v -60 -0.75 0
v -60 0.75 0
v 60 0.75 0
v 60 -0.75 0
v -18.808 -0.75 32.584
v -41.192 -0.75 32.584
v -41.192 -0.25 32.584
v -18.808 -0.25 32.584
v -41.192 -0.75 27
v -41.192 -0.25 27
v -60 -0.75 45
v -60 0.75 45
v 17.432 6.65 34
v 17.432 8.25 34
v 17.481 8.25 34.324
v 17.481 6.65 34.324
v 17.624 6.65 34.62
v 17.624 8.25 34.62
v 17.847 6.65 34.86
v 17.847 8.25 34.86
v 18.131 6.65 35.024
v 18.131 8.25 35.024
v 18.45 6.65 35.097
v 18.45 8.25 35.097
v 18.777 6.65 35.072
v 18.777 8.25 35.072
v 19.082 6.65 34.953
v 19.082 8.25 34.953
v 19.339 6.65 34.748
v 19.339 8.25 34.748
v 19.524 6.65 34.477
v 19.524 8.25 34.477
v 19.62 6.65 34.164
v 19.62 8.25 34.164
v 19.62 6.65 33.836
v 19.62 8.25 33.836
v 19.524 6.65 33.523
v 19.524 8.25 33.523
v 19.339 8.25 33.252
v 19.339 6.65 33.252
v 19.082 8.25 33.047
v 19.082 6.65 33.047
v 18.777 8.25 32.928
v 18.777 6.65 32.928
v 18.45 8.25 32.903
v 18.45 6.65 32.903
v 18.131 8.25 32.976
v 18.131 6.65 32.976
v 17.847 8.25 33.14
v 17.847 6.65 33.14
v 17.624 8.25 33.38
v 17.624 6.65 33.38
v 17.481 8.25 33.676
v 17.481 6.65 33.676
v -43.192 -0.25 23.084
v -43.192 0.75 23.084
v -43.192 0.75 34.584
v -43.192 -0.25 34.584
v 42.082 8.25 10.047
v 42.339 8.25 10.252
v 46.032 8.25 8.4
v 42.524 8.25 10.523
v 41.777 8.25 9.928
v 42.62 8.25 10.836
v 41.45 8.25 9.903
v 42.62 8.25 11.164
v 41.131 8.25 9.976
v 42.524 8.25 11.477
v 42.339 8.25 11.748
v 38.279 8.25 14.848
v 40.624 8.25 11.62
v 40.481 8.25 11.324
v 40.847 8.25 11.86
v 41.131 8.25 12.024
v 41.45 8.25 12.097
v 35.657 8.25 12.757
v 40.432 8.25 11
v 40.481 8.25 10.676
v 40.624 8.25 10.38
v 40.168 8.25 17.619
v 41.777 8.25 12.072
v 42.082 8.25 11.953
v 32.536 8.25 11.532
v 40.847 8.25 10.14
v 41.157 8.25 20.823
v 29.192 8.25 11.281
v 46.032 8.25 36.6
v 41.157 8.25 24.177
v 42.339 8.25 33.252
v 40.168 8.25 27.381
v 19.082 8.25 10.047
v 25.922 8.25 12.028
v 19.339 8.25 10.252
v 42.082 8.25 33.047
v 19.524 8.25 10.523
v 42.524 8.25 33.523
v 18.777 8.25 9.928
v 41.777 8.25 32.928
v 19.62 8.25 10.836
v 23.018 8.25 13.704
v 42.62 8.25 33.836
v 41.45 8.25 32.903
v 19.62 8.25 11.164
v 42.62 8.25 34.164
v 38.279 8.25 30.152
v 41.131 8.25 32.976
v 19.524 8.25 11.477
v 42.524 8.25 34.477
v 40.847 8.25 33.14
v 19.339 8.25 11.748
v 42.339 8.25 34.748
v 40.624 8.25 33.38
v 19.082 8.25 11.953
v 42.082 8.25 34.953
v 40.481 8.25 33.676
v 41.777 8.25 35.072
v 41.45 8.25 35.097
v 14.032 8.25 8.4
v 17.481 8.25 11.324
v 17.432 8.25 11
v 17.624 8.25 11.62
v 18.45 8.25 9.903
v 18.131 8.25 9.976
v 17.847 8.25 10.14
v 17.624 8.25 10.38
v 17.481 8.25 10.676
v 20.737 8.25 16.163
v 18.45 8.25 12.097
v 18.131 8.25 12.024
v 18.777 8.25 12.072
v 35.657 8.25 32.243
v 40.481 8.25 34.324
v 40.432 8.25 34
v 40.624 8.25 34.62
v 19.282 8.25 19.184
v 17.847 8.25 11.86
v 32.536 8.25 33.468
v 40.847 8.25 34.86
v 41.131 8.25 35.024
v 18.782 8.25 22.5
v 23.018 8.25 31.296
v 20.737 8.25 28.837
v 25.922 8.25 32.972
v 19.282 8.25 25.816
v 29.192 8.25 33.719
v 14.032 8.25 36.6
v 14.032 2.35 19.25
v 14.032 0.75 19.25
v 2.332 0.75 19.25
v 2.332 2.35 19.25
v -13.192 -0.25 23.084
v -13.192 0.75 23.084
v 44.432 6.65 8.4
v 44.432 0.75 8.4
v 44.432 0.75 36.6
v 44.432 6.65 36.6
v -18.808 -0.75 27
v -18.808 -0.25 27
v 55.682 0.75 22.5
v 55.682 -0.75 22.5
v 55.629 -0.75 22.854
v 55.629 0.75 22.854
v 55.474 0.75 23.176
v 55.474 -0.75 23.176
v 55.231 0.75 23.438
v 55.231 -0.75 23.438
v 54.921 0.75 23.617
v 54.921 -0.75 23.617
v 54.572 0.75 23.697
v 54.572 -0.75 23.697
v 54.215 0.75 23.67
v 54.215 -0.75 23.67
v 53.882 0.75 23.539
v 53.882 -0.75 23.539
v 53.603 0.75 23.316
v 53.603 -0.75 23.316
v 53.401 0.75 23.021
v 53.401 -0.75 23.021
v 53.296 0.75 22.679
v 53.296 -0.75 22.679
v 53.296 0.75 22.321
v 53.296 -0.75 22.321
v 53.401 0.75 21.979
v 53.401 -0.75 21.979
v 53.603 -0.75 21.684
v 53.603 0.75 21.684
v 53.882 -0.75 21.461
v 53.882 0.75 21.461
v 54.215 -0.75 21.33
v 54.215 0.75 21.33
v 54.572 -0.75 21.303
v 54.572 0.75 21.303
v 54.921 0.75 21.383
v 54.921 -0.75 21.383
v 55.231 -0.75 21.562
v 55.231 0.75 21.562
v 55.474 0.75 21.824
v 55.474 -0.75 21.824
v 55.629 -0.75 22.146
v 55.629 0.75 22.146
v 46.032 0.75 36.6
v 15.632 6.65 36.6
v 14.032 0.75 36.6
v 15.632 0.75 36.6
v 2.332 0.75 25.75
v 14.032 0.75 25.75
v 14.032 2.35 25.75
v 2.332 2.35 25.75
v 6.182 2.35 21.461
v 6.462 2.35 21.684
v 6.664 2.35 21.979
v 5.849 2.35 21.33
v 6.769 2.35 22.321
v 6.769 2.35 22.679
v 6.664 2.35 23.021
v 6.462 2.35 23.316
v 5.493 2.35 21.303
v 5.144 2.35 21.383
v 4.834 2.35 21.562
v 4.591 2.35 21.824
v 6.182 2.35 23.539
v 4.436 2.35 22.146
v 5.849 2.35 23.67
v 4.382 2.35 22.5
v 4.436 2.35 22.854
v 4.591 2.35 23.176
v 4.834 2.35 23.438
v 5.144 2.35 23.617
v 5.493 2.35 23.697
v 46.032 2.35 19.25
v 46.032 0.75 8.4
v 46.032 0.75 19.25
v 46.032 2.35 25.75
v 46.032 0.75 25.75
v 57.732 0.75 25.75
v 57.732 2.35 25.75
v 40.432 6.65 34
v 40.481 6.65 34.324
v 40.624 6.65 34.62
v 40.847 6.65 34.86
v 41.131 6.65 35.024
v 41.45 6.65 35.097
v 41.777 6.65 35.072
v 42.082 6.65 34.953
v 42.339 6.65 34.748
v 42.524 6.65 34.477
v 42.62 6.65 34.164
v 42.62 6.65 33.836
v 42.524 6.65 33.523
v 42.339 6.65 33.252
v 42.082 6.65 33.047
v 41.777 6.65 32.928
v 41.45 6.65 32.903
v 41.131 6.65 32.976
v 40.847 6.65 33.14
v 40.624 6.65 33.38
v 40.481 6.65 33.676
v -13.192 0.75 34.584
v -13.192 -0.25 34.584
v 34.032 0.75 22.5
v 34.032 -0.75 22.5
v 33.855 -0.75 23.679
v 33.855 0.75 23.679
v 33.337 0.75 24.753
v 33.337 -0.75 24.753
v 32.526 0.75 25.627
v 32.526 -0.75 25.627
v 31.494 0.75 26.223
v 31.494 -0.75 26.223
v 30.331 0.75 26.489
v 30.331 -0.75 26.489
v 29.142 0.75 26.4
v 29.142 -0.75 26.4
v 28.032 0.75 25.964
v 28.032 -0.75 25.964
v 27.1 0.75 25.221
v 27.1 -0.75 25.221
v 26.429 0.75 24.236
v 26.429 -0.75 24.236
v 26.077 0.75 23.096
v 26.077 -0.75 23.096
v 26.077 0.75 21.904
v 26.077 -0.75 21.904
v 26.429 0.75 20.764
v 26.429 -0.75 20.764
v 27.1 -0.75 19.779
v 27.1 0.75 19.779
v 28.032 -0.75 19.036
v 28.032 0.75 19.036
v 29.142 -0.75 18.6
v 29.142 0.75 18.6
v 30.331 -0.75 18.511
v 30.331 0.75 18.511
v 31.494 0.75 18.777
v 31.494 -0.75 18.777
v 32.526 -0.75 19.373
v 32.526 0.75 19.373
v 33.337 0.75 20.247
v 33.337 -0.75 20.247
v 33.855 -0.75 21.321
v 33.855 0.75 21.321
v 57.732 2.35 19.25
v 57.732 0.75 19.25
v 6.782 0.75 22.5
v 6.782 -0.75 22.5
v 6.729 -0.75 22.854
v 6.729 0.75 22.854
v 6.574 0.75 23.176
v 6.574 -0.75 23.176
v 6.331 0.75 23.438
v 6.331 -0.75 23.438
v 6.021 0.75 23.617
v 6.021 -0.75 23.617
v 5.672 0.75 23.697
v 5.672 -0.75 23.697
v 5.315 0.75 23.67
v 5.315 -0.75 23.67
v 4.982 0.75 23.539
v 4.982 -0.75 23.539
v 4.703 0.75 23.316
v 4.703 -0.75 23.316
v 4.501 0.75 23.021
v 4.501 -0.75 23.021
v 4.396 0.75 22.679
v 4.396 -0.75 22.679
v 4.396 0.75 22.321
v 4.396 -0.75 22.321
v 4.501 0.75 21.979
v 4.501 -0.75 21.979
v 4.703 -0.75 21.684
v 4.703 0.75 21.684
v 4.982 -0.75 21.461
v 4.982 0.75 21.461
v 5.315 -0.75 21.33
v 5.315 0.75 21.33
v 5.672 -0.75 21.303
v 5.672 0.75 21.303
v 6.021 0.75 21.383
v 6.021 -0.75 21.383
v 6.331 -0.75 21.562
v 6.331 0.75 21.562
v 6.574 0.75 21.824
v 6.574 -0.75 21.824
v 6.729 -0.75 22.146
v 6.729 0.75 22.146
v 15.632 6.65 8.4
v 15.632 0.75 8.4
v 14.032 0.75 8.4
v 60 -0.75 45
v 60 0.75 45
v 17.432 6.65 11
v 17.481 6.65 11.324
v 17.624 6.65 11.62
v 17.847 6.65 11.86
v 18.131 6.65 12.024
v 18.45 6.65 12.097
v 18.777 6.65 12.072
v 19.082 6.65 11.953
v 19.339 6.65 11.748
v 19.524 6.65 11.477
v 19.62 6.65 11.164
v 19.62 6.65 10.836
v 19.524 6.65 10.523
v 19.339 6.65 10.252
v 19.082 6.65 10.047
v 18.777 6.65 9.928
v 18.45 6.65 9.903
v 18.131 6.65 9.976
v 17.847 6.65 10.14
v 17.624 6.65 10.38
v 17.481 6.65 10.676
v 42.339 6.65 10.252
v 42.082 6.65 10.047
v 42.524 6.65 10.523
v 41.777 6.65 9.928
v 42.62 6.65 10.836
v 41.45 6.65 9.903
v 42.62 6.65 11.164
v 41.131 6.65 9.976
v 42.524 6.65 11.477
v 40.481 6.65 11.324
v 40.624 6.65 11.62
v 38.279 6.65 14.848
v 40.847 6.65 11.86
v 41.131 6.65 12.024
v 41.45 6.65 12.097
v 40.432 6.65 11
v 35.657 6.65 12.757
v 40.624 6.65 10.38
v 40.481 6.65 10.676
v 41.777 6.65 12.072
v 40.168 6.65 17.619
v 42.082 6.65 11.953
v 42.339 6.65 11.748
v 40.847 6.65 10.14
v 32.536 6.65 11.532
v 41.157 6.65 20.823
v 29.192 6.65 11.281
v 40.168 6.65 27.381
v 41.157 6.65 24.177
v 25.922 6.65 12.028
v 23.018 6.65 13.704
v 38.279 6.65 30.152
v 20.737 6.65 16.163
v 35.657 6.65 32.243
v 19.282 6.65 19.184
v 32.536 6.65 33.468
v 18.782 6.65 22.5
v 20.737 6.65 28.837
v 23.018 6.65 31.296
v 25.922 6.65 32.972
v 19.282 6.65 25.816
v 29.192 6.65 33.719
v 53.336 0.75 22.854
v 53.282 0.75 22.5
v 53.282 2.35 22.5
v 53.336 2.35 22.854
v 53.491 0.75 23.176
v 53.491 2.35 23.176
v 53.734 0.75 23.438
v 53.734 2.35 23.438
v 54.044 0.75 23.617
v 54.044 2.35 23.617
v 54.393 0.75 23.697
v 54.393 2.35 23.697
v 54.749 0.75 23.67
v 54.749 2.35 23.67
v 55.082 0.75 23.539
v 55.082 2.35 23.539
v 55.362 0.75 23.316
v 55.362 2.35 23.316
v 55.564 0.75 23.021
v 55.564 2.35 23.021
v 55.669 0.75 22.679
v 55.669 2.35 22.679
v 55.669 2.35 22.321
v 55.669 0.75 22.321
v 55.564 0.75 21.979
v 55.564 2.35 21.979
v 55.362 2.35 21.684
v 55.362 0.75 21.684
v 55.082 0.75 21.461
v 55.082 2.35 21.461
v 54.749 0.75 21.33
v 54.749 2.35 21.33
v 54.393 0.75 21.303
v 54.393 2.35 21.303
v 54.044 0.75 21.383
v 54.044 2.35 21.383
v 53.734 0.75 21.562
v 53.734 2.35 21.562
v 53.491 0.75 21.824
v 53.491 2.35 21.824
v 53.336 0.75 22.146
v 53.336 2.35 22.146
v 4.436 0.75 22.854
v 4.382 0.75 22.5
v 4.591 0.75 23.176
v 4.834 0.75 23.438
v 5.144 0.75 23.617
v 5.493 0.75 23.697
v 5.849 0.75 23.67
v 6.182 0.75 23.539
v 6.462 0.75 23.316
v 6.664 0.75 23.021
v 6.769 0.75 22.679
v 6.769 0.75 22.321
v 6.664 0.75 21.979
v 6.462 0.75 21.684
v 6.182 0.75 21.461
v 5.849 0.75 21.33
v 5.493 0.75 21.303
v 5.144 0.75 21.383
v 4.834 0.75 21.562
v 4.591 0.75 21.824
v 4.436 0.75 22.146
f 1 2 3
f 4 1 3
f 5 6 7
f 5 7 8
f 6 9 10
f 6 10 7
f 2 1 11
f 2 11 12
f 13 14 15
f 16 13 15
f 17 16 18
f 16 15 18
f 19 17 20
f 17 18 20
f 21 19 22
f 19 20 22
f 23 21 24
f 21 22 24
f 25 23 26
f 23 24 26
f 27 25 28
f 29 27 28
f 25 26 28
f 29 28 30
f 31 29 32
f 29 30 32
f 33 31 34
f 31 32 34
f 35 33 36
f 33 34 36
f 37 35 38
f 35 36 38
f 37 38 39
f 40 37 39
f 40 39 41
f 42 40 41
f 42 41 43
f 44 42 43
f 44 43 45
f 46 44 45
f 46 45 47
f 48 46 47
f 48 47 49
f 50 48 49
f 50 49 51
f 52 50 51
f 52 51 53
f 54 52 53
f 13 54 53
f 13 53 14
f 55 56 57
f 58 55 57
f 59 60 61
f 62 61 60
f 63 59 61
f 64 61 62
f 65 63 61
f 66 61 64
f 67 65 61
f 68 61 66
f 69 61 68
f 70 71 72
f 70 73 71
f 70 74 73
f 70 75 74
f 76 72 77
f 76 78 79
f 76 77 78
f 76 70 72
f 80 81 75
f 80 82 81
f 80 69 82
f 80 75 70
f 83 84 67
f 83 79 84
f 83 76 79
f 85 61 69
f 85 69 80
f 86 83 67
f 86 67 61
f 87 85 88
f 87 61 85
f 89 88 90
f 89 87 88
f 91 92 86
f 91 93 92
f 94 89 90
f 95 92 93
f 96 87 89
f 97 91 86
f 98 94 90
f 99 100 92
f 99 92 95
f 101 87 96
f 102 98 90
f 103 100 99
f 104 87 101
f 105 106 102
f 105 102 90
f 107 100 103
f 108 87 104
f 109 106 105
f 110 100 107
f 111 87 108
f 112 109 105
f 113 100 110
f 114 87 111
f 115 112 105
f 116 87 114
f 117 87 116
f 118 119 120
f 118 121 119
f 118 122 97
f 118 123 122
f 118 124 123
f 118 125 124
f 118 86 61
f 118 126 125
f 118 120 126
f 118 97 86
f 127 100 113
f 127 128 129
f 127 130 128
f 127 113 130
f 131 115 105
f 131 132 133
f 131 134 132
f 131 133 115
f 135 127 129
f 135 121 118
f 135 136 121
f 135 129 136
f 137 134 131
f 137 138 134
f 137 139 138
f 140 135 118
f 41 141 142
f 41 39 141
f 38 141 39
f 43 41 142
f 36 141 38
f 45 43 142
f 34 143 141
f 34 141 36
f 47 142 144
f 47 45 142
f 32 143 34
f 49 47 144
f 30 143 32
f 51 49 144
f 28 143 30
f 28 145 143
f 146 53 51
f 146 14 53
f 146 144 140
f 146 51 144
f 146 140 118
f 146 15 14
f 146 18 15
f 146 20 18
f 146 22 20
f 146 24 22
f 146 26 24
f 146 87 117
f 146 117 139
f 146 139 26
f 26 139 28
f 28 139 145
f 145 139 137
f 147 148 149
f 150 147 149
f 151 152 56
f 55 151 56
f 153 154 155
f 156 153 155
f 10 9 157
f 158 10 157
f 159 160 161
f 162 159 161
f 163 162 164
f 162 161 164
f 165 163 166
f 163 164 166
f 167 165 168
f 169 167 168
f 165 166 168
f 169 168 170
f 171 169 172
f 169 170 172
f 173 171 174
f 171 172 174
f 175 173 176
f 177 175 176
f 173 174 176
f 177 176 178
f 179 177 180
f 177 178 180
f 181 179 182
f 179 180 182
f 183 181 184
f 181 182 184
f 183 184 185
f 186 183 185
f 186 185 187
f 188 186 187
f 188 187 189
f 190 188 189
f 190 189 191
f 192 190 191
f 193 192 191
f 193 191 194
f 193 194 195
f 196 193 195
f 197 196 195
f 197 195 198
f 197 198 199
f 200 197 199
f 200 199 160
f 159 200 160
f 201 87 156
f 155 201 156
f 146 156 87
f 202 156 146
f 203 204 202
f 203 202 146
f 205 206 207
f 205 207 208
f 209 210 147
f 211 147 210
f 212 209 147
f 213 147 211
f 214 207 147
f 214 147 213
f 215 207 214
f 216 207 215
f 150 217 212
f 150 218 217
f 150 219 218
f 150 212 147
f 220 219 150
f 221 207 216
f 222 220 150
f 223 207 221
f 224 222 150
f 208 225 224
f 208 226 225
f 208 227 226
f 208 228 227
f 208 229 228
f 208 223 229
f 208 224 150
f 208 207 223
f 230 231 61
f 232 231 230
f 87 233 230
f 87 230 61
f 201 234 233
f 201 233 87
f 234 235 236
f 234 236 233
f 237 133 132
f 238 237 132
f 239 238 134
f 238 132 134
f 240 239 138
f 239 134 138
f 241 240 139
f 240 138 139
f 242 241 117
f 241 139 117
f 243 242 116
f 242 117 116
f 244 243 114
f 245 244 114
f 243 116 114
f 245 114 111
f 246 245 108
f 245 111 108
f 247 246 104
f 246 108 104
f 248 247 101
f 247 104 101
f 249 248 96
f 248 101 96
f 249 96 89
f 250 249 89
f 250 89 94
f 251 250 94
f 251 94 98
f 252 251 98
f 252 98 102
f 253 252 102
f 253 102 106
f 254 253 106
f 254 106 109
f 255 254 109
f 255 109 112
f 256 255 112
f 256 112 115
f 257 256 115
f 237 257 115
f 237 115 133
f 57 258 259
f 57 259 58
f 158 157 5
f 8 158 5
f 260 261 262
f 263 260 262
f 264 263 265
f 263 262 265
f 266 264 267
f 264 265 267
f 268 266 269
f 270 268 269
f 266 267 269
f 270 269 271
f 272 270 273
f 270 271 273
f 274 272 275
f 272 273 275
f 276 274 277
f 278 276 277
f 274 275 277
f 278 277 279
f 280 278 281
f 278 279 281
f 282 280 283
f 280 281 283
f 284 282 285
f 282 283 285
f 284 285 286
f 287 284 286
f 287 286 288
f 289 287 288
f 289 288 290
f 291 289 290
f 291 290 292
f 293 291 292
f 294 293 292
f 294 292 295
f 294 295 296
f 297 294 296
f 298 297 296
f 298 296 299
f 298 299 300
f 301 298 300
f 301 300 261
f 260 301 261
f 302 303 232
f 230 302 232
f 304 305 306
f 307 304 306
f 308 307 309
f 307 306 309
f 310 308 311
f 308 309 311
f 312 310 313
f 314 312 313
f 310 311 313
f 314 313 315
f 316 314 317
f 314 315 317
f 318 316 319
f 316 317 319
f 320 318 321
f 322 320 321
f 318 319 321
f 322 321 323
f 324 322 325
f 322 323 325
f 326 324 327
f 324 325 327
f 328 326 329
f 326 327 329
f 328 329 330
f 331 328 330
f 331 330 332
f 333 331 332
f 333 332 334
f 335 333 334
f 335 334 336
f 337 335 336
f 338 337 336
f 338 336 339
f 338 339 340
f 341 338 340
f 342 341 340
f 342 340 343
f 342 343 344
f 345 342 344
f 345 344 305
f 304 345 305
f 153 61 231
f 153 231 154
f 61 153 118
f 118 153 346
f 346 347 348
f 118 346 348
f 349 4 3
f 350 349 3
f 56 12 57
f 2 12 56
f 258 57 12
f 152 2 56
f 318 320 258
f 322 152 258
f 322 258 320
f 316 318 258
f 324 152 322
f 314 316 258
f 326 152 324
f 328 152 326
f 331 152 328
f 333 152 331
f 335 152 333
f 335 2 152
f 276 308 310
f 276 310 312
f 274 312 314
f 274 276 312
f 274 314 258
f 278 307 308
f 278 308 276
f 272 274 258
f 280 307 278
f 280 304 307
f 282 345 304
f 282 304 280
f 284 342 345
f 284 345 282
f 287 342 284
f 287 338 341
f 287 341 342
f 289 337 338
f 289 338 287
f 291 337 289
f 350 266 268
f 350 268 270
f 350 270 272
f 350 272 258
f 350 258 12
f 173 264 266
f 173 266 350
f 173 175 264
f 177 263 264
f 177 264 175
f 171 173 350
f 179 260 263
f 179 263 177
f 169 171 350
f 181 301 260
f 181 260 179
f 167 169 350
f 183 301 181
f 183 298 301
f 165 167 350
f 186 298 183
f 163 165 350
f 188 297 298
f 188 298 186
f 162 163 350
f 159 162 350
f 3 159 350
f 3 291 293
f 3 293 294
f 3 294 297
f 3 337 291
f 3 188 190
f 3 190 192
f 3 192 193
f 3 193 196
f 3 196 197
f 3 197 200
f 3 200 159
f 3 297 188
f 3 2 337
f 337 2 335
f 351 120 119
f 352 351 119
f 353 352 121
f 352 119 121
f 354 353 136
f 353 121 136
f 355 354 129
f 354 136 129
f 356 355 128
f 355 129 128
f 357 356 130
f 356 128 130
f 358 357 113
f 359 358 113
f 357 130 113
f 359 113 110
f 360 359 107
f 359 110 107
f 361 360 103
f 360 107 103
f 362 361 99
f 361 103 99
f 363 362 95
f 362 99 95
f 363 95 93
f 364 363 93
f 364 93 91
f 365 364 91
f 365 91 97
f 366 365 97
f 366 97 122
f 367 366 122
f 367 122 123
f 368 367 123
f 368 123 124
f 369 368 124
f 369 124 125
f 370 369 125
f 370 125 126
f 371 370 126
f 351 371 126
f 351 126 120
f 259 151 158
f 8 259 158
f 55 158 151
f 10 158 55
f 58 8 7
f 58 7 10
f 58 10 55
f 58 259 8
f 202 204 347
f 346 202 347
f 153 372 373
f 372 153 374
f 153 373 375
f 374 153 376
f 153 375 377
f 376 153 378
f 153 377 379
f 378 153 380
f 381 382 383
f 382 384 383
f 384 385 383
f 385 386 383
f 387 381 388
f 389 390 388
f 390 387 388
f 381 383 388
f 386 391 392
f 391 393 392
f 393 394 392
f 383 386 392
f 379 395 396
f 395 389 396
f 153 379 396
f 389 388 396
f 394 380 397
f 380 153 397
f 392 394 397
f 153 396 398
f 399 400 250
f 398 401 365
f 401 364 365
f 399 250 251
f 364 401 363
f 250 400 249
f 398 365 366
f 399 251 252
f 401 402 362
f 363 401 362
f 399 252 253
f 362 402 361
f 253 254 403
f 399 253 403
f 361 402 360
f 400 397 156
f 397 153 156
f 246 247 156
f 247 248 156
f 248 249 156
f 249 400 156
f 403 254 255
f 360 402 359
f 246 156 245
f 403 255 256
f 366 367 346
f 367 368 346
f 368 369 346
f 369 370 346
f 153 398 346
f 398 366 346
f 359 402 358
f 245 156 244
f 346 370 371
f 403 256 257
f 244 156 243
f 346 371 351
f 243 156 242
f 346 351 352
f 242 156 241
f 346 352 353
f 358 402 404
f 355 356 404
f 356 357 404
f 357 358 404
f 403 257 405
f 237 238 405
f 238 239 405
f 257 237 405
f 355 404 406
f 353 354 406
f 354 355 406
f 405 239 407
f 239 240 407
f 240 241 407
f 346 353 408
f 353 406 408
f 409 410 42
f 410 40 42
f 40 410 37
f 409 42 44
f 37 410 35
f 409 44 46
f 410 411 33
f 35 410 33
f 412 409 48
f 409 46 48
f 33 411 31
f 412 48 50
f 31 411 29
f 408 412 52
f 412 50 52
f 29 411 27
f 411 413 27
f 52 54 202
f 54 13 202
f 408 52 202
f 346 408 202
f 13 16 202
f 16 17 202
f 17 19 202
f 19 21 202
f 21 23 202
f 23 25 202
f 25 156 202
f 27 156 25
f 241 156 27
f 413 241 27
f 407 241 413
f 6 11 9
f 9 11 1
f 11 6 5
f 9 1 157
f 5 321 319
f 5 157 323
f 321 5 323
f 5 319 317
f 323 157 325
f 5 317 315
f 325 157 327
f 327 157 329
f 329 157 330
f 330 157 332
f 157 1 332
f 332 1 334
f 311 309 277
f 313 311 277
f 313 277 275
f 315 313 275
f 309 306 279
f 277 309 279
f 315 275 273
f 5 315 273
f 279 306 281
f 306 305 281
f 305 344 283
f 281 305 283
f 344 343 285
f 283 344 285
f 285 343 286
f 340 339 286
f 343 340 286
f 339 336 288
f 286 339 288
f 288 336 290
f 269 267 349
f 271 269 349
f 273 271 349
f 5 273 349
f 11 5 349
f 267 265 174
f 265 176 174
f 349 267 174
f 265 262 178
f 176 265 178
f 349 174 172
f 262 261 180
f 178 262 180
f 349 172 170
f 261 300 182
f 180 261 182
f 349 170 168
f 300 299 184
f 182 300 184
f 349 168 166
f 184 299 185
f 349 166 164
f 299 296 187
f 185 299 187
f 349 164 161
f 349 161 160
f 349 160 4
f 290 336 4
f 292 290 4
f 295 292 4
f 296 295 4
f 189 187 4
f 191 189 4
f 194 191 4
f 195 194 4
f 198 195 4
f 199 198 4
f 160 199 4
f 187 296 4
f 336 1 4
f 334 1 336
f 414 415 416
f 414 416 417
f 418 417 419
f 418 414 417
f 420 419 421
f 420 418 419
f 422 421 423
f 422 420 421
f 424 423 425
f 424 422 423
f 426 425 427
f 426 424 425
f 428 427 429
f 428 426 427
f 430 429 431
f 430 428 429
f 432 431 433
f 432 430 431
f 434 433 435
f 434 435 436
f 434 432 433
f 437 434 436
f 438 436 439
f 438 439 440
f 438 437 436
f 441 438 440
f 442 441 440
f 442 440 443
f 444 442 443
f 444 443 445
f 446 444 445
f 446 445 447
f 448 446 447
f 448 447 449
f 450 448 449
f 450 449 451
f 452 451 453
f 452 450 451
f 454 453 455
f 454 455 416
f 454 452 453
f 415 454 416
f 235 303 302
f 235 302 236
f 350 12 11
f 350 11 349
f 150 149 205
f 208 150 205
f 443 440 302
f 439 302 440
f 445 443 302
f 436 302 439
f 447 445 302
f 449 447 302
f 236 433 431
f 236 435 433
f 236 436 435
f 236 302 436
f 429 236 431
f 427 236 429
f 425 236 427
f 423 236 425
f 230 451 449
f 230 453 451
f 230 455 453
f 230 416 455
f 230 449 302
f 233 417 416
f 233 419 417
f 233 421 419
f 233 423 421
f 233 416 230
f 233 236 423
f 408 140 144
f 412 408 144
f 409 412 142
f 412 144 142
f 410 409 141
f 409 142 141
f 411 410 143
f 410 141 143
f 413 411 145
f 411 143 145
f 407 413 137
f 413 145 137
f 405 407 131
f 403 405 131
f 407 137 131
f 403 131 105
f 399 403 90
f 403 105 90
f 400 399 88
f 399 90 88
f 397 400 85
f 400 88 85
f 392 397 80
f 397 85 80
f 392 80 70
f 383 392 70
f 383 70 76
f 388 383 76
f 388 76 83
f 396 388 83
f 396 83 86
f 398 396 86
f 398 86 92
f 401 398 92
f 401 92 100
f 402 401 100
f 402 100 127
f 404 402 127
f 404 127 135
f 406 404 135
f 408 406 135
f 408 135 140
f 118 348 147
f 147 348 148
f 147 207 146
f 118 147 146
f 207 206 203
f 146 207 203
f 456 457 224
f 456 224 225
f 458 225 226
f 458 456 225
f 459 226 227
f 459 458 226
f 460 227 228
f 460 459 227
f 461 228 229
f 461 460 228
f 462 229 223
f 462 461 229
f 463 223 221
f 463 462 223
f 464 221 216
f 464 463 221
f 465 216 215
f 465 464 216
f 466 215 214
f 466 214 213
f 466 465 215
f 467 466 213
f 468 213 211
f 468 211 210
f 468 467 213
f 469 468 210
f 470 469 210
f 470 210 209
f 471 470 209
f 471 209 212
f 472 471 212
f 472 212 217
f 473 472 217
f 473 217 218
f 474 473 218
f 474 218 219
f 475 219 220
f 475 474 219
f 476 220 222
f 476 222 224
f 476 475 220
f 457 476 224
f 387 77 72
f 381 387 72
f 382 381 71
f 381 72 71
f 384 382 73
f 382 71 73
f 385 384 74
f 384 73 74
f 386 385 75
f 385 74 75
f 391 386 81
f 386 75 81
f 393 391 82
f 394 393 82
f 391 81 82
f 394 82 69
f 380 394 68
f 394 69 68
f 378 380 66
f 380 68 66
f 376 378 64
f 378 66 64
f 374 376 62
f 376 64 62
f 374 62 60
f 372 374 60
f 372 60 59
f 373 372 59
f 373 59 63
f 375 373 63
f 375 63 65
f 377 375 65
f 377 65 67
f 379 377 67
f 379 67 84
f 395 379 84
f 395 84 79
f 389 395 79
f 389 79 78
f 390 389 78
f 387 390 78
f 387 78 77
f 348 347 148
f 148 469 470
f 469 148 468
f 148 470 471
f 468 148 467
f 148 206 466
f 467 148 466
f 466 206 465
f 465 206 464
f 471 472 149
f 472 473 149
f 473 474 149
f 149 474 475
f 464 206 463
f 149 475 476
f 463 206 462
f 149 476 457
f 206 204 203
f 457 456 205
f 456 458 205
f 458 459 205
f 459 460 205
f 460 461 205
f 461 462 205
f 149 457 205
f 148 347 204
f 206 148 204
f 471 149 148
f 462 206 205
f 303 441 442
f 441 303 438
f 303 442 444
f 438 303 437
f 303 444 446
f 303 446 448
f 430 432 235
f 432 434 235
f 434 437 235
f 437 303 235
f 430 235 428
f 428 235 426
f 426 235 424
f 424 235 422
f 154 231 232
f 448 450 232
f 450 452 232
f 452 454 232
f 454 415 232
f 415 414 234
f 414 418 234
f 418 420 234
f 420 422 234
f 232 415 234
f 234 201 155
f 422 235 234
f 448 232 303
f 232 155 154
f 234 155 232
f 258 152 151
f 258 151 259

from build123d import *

# Parameters (mm, degrees)
F0_W      = 120
F0_H      = 1.5
F1_DEPTH  = 45
F2_R      = 4
F3_DEPTH  = 25
F4_R      = 1.2
F5_DEPTH  = 25
F6_W      = 11.7
F6_H      = 6.5
F6_R      = 1.2
F7_DEPTH  = 1.6
F8_DEPTH  = 5.9
F9_W      = 32
F9_H      = 28.2
F10_DEPTH = 1.6
F11_R     = 11.25
F12_DEPTH = 25
F13_R     = 1.1
F14_DEPTH = 25
F15_W     = 22.384
F15_H     = 5.584
F16_DEPTH = 25
F17_W     = 30
F17_H     = 11.5
F17_W_2   = 22.384
F17_H_2   = 5.584
F18_DEPTH = 1


with BuildPart() as f1:
    # F0 (on Top) → F1 (new body)
    with BuildSketch(Plane.XY):
        Rectangle(F0_W, F0_H)
    extrude(amount=F1_DEPTH)

    # F2 (on face) → F3 (cut)
    with BuildSketch(Plane.XZ.offset(0.75)):
        with Locations((30.0324354321, 22.5)):
            Circle(F2_R)
    extrude(amount=-F3_DEPTH, mode=Mode.SUBTRACT)

    # F4 (on face) → F5 (cut)
    with BuildSketch(Plane.XZ.offset(0.75)):
        with Locations((5.5824354321, 22.5)):
            Circle(F4_R)
        with Locations((54.4824354321, 22.5)):
            Circle(F4_R)
    extrude(amount=-F5_DEPTH, mode=Mode.SUBTRACT)

    # F15 (on face) → F16 (cut)
    with BuildSketch(Plane.XZ.offset(0.75)):
        with Locations((-30, 29.792)):
            Rectangle(F15_W, F15_H)
    extrude(amount=-F16_DEPTH, mode=Mode.SUBTRACT)

    # F17 (on face) → F18 (cut)
    with BuildSketch(Plane(origin=(0, 0.75, 0), x_dir=(-1, 0, 0), z_dir=(0, 1, 0))):
        with Locations((28.192, 28.834)):
            Rectangle(F17_W, F17_H)
        with Locations((30, 29.792)):
            Rectangle(F17_W_2, F17_H_2, mode=Mode.SUBTRACT)
    extrude(amount=-F18_DEPTH, mode=Mode.SUBTRACT)


with BuildPart() as f7:
    # F6 (on face) → F7 (new body)
    with BuildSketch(Plane(origin=(0, 0.75, 0), x_dir=(-1, 0, 0), z_dir=(0, 1, 0))):
        with Locations((-51.8824354321, 22.5)):
            Rectangle(F6_W, F6_H)
        with Locations((-54.4824354321, 22.5)):
            Circle(F6_R, mode=Mode.SUBTRACT)
    extrude(amount=F7_DEPTH)

    # F6 (on face) → F8 (join)
    with BuildSketch(Plane(origin=(0, 0.75, 0), x_dir=(-1, 0, 0), z_dir=(0, 1, 0))):
        Polygon((-46.0324354321, 36.6), (-46.0324354321, 25.75), (-46.0324354321, 19.25), (-46.0324354321, 8.4), (-44.4324354321, 8.4), (-44.4324354321, 36.6), align=None)
    extrude(amount=F8_DEPTH)



with BuildPart() as f7b:
    # F6 (on face) → F7, piece 2 (new body)
    with BuildSketch(Plane(origin=(0, 0.75, 0), x_dir=(-1, 0, 0), z_dir=(0, 1, 0))):
        with Locations((-8.1824354321, 22.5)):
            Rectangle(F6_W, F6_H)
        with Locations((-5.5824354321, 22.5)):
            Circle(F6_R, mode=Mode.SUBTRACT)
    extrude(amount=F7_DEPTH)

    # F6 (on face) → F8, piece 2 (join)
    with BuildSketch(Plane(origin=(0, 0.75, 0), x_dir=(-1, 0, 0), z_dir=(0, 1, 0))):
        Polygon((-14.0324354321, 25.75), (-14.0324354321, 36.6), (-15.6324354321, 36.6), (-15.6324354321, 8.4), (-14.0324354321, 8.4), (-14.0324354321, 19.25), align=None)
    extrude(amount=F8_DEPTH)


with BuildPart() as f7_1:
    add(f7.part)

    add(f7b.part)  # F10 merges F7b
    # F9 (on face) → F10 (join)
    with BuildSketch(Plane(origin=(0, 6.65, 0), x_dir=(-1, 0, 0), z_dir=(0, 1, 0))):
        with Locations((-30.0324354321, 22.5)):
            Rectangle(F9_W, F9_H)
    extrude(amount=F10_DEPTH)

    # F11 (on face) → F12 (cut)
    with BuildSketch(Plane(origin=(0, 8.25, 0), x_dir=(-1, 0, 0), z_dir=(0, 1, 0))):
        with Locations((-30.0324354321, 22.5)):
            Circle(F11_R)
    extrude(amount=-F12_DEPTH, mode=Mode.SUBTRACT)

    # F13 (on face) → F14 (cut)
    with BuildSketch(Plane(origin=(0, 8.25, 0), x_dir=(-1, 0, 0), z_dir=(0, 1, 0))):
        with Locations((-41.5324354321, 34)):
            Circle(F13_R)
        with Locations((-18.5324354321, 34)):
            Circle(F13_R)
        with Locations((-18.5324354321, 11)):
            Circle(F13_R)
        with Locations((-41.5324354321, 11)):
            Circle(F13_R)
    extrude(amount=-F14_DEPTH, mode=Mode.SUBTRACT)


solid = Compound([f1.part, f7_1.part])
